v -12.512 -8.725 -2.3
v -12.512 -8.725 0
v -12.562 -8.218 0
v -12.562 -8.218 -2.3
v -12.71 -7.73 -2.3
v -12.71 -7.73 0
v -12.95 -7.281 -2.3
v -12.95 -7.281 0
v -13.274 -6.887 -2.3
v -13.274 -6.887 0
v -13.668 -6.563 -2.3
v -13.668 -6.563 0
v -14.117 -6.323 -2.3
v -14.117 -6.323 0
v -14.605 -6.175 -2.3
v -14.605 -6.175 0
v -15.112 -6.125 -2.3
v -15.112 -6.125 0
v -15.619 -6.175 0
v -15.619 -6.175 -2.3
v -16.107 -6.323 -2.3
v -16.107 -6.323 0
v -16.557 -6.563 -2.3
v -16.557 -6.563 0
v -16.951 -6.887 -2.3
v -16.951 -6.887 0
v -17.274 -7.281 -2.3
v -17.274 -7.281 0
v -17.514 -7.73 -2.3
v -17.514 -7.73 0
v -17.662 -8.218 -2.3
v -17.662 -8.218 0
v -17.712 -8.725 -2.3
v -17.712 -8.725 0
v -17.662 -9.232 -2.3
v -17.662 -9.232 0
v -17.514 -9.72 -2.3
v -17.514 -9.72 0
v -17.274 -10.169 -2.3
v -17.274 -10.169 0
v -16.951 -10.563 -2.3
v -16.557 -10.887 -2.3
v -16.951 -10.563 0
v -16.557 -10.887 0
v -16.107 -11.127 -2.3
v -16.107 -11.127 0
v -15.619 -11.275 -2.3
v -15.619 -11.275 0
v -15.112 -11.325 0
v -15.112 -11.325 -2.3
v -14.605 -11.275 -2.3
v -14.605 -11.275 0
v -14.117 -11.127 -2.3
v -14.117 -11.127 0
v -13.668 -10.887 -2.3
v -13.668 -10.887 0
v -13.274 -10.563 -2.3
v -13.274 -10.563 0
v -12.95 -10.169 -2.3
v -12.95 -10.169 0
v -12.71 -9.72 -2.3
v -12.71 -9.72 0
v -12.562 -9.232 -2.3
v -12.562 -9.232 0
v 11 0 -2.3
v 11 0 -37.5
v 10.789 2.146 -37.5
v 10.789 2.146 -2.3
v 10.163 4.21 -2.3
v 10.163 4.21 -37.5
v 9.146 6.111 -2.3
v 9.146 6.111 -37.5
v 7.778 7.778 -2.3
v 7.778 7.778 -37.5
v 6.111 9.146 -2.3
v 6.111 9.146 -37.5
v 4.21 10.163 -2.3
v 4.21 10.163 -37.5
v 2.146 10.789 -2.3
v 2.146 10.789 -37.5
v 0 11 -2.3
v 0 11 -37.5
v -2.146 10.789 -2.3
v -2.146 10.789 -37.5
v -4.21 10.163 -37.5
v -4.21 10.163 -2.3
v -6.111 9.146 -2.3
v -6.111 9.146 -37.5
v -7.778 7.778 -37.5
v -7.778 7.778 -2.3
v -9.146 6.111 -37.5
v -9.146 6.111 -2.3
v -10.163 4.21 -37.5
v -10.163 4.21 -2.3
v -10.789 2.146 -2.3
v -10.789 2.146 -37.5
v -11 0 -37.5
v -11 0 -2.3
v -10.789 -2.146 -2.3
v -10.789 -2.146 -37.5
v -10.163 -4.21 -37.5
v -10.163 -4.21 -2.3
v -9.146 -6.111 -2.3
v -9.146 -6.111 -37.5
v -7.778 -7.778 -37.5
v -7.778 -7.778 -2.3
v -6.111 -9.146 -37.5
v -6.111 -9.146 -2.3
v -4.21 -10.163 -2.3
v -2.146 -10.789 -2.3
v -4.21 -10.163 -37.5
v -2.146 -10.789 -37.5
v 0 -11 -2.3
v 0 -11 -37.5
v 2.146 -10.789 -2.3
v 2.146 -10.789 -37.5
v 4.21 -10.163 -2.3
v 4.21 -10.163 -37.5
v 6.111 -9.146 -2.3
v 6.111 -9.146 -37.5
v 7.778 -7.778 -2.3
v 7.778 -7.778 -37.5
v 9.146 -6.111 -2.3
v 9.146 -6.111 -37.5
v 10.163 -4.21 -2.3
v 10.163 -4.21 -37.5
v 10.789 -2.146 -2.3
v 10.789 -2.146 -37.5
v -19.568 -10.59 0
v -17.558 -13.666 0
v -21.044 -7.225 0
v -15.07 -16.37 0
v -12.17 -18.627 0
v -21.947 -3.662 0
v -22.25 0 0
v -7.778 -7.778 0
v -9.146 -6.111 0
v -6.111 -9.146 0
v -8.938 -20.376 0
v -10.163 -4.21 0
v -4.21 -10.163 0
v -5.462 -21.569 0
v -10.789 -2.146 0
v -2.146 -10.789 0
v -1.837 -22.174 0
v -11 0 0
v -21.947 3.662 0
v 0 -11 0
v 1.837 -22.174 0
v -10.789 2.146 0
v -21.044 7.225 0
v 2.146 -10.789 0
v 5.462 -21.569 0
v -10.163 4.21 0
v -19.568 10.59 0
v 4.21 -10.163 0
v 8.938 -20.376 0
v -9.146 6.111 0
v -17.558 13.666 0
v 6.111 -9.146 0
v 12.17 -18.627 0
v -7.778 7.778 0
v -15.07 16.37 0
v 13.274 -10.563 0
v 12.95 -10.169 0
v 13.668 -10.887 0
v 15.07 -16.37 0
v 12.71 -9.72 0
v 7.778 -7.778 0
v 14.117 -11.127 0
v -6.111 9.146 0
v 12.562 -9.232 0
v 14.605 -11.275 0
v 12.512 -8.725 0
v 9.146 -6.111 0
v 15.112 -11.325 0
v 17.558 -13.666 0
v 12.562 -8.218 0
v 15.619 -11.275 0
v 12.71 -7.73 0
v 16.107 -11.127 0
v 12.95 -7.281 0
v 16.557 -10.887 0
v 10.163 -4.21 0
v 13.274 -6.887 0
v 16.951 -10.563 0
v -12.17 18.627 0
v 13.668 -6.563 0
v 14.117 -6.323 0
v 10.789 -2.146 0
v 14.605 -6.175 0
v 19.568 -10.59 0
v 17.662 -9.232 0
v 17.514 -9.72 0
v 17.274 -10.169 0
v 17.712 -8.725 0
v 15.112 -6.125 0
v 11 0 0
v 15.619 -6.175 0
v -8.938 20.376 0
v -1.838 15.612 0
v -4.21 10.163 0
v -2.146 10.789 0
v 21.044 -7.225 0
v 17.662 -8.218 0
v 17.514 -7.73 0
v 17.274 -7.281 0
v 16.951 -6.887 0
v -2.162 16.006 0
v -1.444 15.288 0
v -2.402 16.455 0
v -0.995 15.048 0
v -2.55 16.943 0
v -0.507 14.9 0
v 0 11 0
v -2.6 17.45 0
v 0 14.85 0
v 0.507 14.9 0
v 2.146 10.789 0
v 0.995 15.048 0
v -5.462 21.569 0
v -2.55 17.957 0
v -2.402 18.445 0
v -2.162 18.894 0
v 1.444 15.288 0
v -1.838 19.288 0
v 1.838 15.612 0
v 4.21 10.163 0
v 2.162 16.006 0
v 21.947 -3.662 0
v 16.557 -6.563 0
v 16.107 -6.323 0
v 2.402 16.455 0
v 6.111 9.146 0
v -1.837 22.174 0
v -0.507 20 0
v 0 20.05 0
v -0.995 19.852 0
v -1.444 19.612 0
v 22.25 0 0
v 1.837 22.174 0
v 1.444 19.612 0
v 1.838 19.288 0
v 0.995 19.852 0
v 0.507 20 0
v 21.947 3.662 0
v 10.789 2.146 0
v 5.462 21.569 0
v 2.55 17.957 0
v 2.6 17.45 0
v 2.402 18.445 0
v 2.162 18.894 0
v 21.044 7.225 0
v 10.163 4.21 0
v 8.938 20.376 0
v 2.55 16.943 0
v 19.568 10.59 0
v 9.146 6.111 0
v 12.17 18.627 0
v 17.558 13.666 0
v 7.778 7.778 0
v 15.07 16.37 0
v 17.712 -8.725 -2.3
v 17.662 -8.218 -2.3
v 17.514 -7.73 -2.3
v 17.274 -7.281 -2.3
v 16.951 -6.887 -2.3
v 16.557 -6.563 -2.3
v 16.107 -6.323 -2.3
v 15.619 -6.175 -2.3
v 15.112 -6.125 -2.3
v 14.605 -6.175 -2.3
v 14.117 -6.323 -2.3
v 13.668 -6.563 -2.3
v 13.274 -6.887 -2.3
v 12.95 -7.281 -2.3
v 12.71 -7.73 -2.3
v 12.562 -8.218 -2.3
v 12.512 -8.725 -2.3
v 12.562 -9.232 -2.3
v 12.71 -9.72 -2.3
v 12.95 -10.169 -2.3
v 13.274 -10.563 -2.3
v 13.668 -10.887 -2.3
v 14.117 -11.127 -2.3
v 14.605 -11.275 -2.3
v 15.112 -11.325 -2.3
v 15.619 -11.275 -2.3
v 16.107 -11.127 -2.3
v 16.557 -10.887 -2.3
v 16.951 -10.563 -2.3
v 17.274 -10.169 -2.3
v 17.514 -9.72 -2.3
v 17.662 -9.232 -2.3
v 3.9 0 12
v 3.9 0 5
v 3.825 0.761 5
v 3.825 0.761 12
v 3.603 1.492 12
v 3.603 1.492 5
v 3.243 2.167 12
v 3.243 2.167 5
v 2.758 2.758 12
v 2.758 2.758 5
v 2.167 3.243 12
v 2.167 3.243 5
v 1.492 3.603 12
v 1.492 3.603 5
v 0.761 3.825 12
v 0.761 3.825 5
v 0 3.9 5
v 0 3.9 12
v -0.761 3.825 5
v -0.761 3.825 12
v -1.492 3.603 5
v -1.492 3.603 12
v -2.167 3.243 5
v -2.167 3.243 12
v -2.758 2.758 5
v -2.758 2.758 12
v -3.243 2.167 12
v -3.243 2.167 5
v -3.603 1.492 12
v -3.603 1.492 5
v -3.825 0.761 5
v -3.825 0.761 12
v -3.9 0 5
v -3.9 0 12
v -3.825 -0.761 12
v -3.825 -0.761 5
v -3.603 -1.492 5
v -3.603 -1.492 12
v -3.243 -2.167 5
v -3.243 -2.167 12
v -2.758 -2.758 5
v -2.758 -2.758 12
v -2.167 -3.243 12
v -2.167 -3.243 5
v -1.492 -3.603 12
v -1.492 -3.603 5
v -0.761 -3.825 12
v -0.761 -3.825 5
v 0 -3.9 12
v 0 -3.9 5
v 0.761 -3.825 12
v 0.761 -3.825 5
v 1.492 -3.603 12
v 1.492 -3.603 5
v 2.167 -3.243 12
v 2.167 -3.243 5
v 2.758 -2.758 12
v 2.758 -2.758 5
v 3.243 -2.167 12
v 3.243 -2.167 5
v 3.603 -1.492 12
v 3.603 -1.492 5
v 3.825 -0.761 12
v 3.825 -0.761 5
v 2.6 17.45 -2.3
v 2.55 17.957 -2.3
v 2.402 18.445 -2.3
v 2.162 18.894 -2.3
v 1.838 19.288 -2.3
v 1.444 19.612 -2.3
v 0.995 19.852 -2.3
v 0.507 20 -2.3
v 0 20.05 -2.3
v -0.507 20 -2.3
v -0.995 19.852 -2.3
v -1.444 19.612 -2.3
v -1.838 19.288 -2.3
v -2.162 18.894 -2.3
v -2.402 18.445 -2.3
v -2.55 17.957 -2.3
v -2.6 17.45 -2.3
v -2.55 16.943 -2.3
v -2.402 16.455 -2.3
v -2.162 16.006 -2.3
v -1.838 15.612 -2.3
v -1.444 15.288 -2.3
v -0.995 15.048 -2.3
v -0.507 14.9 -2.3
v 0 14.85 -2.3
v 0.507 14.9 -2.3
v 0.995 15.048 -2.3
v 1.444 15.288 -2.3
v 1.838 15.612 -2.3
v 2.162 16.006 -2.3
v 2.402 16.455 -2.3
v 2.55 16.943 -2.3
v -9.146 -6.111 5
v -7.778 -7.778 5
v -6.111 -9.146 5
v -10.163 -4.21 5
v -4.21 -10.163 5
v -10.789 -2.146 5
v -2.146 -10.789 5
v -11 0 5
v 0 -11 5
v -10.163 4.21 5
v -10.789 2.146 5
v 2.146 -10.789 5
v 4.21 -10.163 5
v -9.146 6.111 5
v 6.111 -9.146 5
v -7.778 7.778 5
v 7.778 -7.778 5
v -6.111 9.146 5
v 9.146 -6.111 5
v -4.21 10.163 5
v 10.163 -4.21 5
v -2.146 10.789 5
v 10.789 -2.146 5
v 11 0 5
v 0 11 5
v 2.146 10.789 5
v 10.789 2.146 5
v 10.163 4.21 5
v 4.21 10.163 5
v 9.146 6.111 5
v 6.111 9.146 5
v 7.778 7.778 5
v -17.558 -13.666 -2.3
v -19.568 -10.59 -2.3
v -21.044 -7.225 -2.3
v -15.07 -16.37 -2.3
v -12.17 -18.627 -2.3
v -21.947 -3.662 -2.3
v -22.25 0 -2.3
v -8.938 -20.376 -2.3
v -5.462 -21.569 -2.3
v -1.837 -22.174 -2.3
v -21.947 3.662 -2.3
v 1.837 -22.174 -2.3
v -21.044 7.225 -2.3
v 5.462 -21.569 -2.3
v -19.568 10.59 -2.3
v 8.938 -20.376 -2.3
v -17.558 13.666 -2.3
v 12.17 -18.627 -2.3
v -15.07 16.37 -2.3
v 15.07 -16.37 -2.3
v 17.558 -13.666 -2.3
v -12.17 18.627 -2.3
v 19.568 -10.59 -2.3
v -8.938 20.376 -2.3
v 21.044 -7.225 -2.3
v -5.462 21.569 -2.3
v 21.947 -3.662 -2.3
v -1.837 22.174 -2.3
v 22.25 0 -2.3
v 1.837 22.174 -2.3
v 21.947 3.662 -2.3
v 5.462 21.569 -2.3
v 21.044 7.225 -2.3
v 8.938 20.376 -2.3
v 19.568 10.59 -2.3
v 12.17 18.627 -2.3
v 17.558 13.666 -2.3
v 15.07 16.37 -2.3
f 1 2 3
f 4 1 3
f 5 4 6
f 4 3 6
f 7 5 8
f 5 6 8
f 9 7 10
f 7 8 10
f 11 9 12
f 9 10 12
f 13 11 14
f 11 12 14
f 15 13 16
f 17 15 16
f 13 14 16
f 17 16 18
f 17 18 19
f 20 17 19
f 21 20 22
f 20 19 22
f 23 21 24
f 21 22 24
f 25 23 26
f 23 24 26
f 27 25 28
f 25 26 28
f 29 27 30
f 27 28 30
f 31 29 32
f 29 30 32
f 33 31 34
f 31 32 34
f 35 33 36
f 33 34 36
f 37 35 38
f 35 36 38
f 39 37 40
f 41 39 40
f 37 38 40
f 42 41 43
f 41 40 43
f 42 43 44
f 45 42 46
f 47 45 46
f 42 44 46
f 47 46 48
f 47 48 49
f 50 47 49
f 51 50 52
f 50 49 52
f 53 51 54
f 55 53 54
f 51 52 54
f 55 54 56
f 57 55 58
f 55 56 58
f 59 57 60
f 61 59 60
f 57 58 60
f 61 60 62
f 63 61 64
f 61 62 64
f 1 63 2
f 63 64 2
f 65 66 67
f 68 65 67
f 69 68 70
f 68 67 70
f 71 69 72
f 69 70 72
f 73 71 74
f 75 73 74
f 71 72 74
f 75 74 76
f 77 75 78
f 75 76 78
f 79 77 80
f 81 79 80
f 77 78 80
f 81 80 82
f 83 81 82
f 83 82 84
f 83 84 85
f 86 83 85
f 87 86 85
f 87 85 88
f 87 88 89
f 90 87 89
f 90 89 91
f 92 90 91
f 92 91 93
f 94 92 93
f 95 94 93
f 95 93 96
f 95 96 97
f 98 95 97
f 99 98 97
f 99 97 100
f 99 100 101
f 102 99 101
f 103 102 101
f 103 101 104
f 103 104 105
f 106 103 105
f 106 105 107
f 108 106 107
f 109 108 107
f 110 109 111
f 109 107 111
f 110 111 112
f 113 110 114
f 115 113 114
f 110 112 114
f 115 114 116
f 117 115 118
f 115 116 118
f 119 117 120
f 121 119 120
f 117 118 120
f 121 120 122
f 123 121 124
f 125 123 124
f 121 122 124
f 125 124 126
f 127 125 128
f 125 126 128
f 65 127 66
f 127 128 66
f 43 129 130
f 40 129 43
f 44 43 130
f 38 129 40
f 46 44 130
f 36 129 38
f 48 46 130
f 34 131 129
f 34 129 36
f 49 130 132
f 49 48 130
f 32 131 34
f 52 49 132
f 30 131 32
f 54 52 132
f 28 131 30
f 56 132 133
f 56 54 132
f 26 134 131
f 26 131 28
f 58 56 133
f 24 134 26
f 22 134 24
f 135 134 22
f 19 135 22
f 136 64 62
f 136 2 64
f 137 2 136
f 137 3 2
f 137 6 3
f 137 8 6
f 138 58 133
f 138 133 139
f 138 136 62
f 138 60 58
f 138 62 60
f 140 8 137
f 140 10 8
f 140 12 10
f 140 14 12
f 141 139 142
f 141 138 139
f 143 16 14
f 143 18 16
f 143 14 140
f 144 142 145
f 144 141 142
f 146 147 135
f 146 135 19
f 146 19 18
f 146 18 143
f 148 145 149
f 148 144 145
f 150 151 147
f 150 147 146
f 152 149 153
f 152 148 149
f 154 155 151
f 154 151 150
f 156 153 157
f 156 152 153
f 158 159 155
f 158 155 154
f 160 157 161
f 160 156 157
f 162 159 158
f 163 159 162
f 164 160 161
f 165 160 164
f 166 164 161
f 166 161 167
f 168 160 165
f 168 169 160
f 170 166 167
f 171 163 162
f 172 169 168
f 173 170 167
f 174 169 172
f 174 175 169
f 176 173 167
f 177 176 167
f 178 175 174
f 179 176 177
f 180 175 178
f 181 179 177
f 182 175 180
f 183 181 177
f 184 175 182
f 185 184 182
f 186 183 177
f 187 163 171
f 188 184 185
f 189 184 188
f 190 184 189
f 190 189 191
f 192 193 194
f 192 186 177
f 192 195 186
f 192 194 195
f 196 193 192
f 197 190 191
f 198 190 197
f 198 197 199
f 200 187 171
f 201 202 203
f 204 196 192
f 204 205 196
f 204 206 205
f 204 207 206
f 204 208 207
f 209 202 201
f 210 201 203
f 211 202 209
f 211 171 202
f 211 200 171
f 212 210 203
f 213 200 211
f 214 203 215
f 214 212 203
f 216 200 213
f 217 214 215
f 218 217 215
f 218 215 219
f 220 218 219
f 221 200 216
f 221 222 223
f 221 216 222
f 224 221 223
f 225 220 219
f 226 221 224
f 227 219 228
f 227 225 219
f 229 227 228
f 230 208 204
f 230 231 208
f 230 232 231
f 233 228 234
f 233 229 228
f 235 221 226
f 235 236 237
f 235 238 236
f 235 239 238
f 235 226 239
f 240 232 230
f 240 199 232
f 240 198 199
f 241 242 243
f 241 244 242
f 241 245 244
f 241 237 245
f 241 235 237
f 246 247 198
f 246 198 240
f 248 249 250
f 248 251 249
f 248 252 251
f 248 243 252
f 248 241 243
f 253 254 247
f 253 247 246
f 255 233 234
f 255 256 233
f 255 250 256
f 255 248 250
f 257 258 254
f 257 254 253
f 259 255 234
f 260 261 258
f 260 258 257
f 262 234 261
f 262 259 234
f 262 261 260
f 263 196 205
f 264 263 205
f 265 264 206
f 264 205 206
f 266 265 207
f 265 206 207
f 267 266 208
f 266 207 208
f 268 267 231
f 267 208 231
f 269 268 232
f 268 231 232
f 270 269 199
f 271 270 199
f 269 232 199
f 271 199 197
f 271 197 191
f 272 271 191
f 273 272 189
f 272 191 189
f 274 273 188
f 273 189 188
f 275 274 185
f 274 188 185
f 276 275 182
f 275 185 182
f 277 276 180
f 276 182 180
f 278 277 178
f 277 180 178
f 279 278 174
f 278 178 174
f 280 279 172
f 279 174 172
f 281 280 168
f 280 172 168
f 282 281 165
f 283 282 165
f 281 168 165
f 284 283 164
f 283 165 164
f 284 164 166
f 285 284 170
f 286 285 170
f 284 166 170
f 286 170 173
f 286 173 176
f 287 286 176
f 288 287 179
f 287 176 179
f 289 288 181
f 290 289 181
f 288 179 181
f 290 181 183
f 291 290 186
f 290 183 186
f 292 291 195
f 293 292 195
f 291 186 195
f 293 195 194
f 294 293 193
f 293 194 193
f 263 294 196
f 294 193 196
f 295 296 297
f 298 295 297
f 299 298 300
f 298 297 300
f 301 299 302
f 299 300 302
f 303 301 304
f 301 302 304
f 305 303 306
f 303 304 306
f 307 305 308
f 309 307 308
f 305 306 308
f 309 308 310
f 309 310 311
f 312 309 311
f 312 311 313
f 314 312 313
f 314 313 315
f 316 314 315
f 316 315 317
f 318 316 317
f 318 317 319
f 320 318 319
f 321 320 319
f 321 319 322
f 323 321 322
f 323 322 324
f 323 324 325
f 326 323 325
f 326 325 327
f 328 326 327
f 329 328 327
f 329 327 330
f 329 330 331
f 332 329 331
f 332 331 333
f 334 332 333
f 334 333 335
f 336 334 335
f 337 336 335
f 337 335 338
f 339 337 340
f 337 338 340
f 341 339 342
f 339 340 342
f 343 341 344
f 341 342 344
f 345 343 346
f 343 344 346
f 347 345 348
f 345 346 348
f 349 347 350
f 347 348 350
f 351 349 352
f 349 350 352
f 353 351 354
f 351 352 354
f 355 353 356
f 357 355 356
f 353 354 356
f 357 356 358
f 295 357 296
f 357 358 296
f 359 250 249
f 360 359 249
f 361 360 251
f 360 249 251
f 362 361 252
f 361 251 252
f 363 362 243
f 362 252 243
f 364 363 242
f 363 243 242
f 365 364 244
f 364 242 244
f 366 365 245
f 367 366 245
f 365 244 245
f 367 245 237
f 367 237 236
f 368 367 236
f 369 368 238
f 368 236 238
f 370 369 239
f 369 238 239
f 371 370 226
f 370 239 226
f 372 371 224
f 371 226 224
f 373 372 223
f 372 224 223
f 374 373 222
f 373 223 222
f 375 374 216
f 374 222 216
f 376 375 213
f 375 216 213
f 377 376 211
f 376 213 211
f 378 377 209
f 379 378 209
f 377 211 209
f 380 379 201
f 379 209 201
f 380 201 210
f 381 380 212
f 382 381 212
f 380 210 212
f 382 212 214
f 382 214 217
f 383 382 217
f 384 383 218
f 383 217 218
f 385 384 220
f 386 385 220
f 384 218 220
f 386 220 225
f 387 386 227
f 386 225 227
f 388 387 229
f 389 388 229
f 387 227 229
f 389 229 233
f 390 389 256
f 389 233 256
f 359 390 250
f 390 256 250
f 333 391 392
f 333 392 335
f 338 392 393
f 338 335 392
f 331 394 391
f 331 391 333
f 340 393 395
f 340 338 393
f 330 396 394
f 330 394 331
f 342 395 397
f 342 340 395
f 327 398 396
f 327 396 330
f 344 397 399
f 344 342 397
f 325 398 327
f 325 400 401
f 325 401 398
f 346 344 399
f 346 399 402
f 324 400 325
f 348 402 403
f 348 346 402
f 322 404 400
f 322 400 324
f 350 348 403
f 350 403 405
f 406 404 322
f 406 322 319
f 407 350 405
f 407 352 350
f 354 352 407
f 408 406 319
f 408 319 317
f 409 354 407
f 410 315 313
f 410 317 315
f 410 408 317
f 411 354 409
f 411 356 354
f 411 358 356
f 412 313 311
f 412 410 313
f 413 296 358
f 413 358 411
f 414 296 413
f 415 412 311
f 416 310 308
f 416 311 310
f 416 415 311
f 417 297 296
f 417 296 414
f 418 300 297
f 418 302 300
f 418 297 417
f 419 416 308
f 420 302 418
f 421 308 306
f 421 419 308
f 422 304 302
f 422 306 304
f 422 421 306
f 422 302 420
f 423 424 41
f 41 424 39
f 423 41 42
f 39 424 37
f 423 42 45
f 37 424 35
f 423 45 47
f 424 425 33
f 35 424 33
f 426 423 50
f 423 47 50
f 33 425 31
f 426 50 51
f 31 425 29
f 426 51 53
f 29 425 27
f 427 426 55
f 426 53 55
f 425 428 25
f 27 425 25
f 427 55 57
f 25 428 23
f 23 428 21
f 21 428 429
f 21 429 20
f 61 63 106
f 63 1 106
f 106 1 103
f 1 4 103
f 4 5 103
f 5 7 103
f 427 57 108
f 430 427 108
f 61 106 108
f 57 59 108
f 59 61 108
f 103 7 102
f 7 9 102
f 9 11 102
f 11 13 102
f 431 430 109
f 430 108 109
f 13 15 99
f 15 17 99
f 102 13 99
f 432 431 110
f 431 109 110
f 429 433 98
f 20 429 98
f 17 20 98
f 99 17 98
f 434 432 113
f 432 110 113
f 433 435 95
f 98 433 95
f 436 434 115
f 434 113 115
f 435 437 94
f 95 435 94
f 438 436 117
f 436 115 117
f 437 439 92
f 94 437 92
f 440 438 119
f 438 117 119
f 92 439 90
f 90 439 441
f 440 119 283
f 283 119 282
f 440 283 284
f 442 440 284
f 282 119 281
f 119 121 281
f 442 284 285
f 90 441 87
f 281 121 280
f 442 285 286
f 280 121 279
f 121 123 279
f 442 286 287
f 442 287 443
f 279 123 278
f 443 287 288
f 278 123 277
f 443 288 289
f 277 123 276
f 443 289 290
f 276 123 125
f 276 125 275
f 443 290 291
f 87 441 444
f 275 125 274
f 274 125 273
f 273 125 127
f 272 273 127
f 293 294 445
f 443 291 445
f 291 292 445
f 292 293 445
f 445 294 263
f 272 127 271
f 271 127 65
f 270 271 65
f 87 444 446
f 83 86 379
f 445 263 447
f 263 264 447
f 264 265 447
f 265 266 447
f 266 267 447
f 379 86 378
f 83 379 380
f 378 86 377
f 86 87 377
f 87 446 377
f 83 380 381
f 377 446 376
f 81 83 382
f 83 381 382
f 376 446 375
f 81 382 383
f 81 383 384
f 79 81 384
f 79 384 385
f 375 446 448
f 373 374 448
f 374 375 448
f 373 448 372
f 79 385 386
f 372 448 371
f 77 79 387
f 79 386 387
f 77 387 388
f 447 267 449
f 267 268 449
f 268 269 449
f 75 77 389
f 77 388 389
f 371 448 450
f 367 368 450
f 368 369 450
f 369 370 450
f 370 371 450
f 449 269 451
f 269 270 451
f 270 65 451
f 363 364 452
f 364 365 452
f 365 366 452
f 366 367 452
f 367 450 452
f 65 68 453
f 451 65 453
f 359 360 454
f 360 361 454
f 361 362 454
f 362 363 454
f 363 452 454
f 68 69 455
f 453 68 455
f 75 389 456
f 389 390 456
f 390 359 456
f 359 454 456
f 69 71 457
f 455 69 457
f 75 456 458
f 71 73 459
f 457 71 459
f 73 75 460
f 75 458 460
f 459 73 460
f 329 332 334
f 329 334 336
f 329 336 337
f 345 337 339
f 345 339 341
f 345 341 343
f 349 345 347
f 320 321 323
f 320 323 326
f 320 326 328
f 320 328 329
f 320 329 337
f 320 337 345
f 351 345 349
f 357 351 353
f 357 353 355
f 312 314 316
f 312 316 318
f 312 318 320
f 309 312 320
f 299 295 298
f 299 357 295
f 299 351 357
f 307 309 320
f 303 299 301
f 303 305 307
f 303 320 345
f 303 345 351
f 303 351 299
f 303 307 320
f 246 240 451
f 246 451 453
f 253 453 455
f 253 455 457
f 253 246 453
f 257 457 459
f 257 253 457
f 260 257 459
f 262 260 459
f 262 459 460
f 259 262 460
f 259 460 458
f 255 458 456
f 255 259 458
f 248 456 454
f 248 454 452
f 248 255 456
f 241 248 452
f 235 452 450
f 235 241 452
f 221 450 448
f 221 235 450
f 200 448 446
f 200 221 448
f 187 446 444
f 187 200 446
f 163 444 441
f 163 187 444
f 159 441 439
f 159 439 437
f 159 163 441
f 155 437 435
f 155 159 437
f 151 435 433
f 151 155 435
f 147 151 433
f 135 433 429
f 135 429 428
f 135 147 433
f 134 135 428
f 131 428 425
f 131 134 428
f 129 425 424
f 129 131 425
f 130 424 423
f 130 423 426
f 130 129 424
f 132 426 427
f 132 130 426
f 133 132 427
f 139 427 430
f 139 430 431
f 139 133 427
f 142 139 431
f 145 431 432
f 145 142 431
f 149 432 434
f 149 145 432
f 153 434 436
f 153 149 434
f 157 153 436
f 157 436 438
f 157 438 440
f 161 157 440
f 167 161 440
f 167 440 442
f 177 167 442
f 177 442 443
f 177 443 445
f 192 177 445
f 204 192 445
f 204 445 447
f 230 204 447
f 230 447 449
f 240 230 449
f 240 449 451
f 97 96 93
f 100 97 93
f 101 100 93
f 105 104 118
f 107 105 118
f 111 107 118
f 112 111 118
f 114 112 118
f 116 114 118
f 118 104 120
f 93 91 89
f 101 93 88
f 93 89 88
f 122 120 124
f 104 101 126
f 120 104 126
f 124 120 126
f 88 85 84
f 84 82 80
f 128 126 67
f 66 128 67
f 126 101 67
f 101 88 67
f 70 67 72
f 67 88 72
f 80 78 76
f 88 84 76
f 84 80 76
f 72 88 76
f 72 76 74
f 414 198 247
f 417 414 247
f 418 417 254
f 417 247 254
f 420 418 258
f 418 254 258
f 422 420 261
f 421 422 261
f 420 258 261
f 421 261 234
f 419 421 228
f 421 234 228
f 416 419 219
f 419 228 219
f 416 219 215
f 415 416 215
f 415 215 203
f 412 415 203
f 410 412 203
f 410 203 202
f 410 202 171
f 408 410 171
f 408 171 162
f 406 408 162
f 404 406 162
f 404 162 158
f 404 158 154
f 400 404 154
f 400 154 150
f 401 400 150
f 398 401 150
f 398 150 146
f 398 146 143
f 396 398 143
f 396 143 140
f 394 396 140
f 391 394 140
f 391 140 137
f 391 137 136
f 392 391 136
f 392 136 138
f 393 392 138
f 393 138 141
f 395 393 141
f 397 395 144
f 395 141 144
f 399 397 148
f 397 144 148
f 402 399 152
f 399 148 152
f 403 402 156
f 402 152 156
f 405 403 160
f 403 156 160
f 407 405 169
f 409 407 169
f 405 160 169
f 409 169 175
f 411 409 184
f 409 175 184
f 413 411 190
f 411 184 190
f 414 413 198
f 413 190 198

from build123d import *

# Parameters (mm, degrees)
BOSS_EXTRUDE1_DEPTH      = 5
BOSS_EXTRUDE1_DEPTH_BACK = 37.5
SKETCH1_R                = 11
SKETCH1_R_2              = 3.9
SKETCH1_3_R              = 22.25
SKETCH1_3_R_2            = 2.6
SKETCH1_3_R_3            = 11
BOSS_EXTRUDE2_DEPTH      = 2.3
BOSS_EXTRUDE4_DEPTH      = 12
BOSS_EXTRUDE4_DEPTH_BACK = 37.5
SKETCH1_4_R              = 3.9


with BuildPart() as part:
    # Sketch1 → Boss-Extrude1 (new, two sides: drawn at the far end of the back side and taken through both)
    with BuildSketch(Plane.XY.offset(-BOSS_EXTRUDE1_DEPTH_BACK)):
        Circle(SKETCH1_R)
        Circle(SKETCH1_R_2, mode=Mode.SUBTRACT)
    extrude(amount=BOSS_EXTRUDE1_DEPTH + BOSS_EXTRUDE1_DEPTH_BACK)

    # Sketch1<3> → Boss-Extrude2 (add)
    with BuildSketch(Plane.XY):
        Circle(SKETCH1_3_R)
        with Locations((-15.112143296, -8.725)):
            Circle(SKETCH1_3_R_2, mode=Mode.SUBTRACT)
        with Locations((15.112143296, -8.725)):
            Circle(SKETCH1_3_R_2, mode=Mode.SUBTRACT)
        with Locations((0, 17.45)):
            Circle(SKETCH1_3_R_2, mode=Mode.SUBTRACT)
        Circle(SKETCH1_3_R_3, mode=Mode.SUBTRACT)
    extrude(amount=-BOSS_EXTRUDE2_DEPTH)

    # Sketch1<4> → Boss-Extrude4 (add, two sides: drawn at the far end of the back side and taken through both)
    with BuildSketch(Plane.XY.offset(-BOSS_EXTRUDE4_DEPTH_BACK)):
        Circle(SKETCH1_4_R)
    extrude(amount=BOSS_EXTRUDE4_DEPTH + BOSS_EXTRUDE4_DEPTH_BACK)


solid = part.part
